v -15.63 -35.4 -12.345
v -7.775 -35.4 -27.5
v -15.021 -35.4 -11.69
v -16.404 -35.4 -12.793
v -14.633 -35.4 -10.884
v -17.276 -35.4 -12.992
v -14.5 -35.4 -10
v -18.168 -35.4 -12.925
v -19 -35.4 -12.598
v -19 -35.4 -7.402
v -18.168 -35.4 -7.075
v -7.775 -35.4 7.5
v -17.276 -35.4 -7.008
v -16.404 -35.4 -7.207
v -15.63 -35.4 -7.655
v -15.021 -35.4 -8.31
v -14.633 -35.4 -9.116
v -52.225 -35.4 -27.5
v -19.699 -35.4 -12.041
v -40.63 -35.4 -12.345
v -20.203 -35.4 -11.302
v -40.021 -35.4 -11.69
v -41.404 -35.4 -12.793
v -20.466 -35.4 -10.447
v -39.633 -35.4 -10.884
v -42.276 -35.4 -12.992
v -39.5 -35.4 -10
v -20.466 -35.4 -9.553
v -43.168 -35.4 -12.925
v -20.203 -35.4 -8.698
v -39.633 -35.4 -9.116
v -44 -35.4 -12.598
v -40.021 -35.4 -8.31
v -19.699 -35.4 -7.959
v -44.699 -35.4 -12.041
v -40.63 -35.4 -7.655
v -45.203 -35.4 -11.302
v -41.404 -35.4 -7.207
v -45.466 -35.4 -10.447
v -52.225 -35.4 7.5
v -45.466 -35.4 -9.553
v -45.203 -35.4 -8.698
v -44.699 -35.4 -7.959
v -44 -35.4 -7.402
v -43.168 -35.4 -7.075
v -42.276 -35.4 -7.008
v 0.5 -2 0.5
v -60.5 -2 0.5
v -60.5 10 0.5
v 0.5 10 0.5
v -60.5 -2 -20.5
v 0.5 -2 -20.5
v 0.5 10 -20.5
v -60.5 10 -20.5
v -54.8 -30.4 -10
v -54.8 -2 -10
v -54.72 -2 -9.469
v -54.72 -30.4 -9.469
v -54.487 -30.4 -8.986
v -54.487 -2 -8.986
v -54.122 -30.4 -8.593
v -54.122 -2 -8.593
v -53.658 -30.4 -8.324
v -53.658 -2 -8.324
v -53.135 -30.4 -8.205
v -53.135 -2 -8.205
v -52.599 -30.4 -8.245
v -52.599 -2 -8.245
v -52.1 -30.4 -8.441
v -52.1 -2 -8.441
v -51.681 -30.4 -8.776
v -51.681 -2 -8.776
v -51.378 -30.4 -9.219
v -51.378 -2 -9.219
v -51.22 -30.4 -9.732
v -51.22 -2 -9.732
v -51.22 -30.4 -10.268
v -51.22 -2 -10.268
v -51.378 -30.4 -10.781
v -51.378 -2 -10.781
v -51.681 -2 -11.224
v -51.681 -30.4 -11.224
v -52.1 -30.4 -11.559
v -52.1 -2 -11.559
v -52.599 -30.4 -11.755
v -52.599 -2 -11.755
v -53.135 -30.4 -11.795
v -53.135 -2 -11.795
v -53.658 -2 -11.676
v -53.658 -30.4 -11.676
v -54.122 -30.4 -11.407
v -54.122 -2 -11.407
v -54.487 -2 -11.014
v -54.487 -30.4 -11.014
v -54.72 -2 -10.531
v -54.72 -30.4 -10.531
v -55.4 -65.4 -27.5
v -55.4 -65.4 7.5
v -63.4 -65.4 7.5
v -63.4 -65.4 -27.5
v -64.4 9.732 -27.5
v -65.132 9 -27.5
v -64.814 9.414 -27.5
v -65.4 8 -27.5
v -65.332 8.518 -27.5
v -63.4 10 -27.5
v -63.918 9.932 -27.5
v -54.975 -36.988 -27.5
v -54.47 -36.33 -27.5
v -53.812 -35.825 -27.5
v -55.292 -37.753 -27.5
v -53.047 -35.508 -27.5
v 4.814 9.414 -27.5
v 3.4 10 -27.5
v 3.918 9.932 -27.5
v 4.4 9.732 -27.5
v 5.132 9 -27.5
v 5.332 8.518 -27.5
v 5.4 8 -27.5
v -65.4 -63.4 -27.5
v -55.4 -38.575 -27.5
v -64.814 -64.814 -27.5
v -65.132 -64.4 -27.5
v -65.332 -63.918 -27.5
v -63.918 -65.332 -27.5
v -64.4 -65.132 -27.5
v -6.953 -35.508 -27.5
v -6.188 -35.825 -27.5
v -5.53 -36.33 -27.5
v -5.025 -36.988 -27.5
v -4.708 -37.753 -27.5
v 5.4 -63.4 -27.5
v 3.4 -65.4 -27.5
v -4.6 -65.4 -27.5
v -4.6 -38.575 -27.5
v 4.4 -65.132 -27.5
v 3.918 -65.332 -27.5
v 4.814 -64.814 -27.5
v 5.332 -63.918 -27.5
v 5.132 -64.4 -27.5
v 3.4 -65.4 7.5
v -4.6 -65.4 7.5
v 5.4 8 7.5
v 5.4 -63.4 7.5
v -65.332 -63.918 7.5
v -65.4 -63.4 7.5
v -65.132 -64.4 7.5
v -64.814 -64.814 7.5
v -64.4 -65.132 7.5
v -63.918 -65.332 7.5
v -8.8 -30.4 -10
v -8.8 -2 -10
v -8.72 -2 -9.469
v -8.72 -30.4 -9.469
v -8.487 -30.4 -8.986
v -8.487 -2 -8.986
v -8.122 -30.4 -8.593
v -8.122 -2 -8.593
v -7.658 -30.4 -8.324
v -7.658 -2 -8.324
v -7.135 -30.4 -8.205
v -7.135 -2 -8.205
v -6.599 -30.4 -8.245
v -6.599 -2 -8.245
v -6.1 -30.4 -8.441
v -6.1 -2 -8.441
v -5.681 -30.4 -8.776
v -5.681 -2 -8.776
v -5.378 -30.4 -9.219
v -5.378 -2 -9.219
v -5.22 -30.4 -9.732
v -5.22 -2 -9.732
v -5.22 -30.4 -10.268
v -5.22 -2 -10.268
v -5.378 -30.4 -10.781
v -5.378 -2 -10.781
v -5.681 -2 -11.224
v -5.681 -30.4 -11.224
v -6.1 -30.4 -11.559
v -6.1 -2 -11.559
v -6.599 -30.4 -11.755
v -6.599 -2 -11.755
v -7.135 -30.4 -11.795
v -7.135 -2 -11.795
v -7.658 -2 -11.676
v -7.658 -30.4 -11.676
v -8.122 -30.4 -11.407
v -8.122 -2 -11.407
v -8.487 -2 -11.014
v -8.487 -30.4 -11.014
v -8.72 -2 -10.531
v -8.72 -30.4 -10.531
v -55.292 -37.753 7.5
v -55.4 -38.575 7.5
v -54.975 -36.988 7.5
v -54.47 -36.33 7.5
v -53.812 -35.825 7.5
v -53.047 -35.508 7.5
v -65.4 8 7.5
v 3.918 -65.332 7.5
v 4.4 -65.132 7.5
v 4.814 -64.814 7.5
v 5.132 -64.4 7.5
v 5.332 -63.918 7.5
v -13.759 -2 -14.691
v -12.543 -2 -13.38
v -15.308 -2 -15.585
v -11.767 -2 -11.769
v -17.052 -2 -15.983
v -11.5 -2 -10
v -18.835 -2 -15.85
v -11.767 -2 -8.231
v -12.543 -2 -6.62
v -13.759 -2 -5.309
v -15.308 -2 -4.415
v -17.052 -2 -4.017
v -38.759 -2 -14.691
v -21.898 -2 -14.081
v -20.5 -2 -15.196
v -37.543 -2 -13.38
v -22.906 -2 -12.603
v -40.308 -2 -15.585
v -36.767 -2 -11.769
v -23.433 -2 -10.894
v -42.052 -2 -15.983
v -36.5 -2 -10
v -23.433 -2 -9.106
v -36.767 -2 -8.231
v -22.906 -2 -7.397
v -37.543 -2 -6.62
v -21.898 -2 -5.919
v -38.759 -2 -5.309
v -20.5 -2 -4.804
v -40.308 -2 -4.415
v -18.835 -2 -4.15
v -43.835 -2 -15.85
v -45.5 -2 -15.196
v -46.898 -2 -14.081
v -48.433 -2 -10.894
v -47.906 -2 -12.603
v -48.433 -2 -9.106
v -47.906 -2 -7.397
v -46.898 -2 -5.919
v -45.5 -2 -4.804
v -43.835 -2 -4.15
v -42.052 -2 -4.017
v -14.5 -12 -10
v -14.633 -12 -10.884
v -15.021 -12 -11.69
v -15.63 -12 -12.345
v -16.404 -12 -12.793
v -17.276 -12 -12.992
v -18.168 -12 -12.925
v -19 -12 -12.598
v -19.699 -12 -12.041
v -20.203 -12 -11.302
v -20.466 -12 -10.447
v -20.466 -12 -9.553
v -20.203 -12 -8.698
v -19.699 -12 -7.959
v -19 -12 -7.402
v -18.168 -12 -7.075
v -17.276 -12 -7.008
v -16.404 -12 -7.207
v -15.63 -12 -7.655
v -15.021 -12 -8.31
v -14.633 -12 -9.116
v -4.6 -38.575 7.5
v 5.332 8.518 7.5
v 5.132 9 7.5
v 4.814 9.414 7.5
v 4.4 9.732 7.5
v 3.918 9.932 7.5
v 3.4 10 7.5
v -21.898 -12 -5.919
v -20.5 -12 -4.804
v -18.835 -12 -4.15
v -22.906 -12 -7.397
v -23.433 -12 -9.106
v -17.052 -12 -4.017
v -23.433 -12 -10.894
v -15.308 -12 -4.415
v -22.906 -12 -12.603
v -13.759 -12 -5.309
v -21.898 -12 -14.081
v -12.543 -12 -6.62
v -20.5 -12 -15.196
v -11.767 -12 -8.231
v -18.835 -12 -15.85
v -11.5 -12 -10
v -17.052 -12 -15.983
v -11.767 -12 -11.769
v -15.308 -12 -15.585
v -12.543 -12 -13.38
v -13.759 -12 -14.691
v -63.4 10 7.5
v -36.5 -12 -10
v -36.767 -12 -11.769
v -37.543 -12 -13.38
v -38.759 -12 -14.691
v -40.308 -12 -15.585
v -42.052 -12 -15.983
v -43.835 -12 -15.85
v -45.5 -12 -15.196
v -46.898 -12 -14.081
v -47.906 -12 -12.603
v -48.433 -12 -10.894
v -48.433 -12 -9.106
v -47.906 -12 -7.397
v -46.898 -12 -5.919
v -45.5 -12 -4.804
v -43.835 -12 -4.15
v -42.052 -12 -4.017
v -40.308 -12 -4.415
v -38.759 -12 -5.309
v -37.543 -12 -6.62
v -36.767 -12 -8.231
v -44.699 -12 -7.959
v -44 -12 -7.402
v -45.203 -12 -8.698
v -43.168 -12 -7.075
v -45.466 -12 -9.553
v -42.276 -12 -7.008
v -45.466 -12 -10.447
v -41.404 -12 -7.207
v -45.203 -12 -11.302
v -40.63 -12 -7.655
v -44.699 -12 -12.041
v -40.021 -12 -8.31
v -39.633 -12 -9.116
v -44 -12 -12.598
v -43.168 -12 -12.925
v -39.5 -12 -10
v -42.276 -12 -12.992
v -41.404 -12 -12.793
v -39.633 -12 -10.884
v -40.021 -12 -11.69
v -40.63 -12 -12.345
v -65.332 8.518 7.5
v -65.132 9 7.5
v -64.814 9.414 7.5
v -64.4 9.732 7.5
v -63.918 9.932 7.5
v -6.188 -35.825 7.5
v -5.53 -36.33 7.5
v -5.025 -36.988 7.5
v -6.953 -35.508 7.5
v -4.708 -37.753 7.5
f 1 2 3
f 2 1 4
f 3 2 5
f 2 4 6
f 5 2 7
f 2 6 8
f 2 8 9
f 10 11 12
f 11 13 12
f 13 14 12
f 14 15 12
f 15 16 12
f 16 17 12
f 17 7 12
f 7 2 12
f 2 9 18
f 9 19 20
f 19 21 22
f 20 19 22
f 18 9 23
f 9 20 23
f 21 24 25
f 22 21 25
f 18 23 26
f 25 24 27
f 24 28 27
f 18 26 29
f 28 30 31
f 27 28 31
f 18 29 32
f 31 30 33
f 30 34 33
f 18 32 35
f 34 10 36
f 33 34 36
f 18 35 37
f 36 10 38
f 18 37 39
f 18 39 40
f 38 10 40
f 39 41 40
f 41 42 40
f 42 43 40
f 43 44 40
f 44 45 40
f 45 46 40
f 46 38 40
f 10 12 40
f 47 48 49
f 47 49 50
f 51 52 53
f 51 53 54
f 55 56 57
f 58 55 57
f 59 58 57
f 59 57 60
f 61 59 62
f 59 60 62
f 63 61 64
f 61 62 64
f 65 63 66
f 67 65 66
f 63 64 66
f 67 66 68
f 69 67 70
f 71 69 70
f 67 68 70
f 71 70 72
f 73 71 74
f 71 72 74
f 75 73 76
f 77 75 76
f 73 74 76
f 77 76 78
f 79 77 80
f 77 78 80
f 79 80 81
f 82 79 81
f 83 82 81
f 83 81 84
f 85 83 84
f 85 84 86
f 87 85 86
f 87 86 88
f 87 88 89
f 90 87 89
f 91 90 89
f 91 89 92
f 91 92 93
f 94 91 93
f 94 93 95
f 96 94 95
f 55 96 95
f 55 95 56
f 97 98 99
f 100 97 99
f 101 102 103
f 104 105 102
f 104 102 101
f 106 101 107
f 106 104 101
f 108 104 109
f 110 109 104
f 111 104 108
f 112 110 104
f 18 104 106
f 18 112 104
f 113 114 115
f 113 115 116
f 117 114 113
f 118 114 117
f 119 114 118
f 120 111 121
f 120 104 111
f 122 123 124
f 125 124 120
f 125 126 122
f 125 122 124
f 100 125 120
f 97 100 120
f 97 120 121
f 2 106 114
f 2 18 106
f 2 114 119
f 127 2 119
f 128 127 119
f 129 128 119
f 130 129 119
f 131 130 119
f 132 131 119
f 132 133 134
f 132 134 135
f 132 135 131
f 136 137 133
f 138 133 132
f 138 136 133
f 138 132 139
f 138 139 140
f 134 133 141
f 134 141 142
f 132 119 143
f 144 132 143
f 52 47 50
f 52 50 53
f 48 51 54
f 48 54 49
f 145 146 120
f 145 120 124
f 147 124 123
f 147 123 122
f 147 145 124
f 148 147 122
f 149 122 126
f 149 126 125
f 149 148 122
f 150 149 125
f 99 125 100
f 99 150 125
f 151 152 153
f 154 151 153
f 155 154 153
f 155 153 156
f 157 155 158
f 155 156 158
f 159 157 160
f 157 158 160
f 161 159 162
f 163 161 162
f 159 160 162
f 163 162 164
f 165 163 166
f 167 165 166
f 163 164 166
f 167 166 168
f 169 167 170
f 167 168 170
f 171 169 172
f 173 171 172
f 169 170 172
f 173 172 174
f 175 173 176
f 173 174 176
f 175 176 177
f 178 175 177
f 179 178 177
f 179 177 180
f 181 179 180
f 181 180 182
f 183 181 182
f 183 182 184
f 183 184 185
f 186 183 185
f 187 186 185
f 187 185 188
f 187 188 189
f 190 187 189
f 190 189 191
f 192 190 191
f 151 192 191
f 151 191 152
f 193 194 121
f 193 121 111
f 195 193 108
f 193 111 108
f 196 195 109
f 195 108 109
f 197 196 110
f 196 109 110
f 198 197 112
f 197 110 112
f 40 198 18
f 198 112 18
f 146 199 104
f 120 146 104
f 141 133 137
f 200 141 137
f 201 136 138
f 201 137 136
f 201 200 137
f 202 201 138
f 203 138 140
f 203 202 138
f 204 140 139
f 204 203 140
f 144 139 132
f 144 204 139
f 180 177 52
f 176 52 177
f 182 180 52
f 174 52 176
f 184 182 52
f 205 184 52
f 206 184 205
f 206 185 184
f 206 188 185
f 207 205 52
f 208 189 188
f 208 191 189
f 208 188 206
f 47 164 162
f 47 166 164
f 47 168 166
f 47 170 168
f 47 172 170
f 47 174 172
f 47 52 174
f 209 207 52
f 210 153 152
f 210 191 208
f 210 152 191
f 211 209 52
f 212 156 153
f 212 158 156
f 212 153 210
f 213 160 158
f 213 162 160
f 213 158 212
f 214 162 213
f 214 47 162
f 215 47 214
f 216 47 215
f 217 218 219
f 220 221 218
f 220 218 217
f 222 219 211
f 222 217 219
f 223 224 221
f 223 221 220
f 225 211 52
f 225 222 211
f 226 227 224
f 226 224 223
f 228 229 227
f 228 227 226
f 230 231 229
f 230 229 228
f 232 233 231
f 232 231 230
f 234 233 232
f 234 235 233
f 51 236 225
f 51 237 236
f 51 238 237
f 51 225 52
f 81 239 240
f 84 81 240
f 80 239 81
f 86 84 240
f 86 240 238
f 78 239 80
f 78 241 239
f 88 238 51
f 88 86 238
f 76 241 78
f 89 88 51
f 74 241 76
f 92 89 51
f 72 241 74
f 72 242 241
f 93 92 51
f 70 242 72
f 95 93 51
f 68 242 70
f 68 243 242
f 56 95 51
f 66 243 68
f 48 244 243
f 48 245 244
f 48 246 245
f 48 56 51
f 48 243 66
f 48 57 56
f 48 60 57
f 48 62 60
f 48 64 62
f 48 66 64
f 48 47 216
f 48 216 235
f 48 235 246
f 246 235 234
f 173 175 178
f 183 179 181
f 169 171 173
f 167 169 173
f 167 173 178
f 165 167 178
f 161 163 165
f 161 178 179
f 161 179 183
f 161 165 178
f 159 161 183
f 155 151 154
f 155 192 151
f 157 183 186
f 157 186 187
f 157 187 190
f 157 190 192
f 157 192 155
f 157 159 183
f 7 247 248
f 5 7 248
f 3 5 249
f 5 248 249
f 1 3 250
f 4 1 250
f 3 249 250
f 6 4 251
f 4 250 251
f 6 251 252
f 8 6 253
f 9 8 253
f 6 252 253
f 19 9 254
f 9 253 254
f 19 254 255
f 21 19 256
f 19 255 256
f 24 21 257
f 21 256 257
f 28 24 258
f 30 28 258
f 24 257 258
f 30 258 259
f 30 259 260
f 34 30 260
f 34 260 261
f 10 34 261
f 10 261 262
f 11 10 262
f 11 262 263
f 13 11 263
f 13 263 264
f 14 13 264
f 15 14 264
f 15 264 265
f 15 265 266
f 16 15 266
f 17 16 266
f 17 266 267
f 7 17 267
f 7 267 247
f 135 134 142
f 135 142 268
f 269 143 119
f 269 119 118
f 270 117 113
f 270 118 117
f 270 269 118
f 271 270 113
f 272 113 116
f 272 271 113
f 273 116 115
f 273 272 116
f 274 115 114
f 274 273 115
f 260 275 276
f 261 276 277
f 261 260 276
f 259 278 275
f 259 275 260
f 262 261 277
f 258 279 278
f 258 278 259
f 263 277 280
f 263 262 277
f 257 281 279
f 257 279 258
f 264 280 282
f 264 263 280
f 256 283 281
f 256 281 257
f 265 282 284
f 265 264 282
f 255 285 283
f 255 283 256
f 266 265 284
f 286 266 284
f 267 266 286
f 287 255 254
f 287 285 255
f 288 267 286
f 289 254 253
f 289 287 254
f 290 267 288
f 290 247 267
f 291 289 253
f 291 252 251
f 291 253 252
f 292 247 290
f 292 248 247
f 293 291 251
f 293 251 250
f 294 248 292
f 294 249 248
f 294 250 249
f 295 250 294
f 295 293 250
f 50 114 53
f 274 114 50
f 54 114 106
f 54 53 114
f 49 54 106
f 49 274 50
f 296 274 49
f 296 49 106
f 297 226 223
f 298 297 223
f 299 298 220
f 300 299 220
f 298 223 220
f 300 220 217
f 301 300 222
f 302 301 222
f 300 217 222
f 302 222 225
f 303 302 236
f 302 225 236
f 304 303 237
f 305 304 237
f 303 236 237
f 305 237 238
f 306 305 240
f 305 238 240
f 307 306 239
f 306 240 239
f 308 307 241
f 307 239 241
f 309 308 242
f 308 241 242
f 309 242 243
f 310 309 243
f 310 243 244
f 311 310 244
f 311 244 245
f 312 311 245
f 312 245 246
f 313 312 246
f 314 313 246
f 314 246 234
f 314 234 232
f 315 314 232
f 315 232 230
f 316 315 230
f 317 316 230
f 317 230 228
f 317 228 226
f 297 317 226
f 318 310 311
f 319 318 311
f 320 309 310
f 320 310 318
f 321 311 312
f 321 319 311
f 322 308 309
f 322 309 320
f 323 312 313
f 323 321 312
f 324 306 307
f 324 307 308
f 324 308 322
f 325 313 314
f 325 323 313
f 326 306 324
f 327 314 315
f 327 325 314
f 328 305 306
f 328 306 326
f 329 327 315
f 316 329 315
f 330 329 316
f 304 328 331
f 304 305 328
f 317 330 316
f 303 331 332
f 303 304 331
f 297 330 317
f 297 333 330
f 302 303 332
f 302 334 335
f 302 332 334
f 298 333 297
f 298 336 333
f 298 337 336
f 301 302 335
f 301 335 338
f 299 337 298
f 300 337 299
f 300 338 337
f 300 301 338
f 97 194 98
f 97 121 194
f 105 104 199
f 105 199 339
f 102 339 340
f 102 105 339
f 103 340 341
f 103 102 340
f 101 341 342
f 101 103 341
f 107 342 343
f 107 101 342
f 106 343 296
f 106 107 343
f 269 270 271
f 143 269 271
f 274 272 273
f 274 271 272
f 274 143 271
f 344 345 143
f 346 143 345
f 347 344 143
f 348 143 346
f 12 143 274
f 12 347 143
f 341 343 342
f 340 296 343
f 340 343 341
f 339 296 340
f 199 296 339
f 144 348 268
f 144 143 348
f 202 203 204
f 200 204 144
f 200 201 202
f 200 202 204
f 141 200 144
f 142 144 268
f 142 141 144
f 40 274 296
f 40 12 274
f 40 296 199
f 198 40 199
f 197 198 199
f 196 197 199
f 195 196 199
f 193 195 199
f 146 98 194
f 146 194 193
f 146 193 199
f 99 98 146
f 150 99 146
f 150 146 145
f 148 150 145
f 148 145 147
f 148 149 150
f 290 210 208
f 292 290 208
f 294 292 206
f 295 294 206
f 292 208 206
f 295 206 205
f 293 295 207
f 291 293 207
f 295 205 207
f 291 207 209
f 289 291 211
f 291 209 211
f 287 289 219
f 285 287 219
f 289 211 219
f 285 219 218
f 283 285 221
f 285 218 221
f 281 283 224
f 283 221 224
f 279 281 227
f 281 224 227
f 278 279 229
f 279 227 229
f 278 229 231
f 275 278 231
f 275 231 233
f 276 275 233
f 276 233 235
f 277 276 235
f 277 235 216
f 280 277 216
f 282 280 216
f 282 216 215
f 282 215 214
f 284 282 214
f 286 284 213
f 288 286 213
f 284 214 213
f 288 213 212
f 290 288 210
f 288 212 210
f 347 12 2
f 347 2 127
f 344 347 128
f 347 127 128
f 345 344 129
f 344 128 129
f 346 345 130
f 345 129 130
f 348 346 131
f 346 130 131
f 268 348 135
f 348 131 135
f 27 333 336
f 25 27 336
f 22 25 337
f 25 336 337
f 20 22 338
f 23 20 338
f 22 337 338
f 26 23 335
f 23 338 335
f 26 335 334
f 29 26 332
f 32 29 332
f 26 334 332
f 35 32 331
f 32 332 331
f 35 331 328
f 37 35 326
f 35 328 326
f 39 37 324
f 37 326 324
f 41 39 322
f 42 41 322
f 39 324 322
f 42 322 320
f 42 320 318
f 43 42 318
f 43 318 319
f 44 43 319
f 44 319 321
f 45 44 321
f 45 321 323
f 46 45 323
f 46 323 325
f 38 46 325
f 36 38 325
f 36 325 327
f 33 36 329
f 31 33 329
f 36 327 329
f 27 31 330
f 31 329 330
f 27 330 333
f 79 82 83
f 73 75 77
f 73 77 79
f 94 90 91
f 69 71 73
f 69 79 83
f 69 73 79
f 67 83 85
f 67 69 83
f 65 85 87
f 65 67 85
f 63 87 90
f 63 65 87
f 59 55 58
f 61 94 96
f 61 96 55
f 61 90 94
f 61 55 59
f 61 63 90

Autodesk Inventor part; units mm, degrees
ref_plane "YZ Plane" through (0, 0, 0) normal (1, 0, 0) x (0, 1, 0)
ref_plane "XZ Plane" through (0, 0, 0) normal (0, 1, 0) x (-1, 0, 0)
ref_plane "XY Plane" through (0, 0, 0) normal (0, 0, 1) x (1, 0, 0)
sketch "Sketch1" plane through (0, 0, 0) normal (0, 1, 0) x (-1, 0, 0)
  line L0 (0, 0) -> (60, 0) construction
  line L1 (60, 0) -> (60, -20) construction
  line L2 (60, -20) -> (0, -20) construction
  line L3 (0, -20) -> (0, 0) construction
  line L4 (60.5, 0.5) -> (-0.5, 0.5)
  line L5 (-0.5, 0.5) -> (-0.5, -20.5)
  line L6 (-0.5, -20.5) -> (60.5, -20.5)
  line L7 (60.5, -20.5) -> (60.5, 0.5)
  circle A0 centre (53, -10) radius 1.8
  circle A1 centre (7, -10) radius 1.8
  line L8 (53, -10) -> (7, -10) construction
  point P0 (30, -10)
  point P1 (30, -20)
  point P2 (7, -10)
  point P3 (0, -10)
  dimension "d0" = 20
  dimension "d1" = 60
  dimension "d2" = 0.5
  dimension "d3" = 0.5
  dimension "d4" = 0.5
  dimension "d5" = 0.5
  dimension "d6" = 3.6
  dimension "d7" = 46
sketch "Sketch2" plane through (0, 0, 0) normal (0, 1, 0) x (-1, 0, 0)
  line L0 (-5.4, 7.5) -> (65.4, 7.5)
  line L1 (65.4, 7.5) -> (65.4, -27.5)
  line L2 (65.4, -27.5) -> (-5.4, -27.5)
  line L3 (-5.4, -27.5) -> (-5.4, 7.5)
  line L4 (60.5, -20.5) -> (60.5, 0.5) construction
  line L5 (-0.5, 0.5) -> (-0.5, -20.5) construction
  line L6 (-0.5, -20.5) -> (60.5, -20.5) construction
  point P0 (0, 0)
  point P1 (60.5, -10)
  point P2 (65.4, -10)
  point P3 (30, -20.5)
  point P4 (30, -27.5)
  dimension "d9" = 70.8
  dimension "d10" = 35
extrude "Extrusion1" add sketch "Sketch2" along normal blind 10 and the other way blind 35.4
extrude "Extrusion2" cut sketch "Sketch1" along normal blind 10 and the other way blind 2
extrude "Extrusion3" cut sketch "Sketch1" along normal blind 10 and the other way blind 30.4 contours A0 | A1
sketch "Sketch3" plane through (5.4, 10, -27.5) normal (0, 0, -1) x (-1, 0, 0)
  line L0 (70.8, -45.4) -> (0, -45.4) projected
  line L1 (0, -45.4) -> (0, -75.4)
  line L2 (0, -75.4) -> (10, -75.4)
  line L3 (10, -75.4) -> (10, -48.575)
  line L4 (13.175, -45.4) -> (57.625, -45.4)
  line L5 (60.8, -48.575) -> (60.8, -75.4)
  line L6 (60.8, -75.4) -> (70.8, -75.4)
  line L7 (70.8, -75.4) -> (70.8, -45.4)
  arc A0 (13.175, -45.4) -> (10, -48.575) centre (13.175, -48.575) ccw
  arc A1 (60.8, -48.575) -> (57.625, -45.4) centre (57.625, -48.575) ccw
  point P0 (5.4, -10)
  point P1 (10, -45.4)
  point P2 (60.8, -45.4)
  point P3 (35.4, -45.4)
  point P4 (13.175, -45.4)
  point P5 (57.625, -45.4)
  dimension "d23" = 50.8
  dimension "d24" = 3.175
  dimension "d25" = 10
  dimension "d26" = 30
extrude "Extrusion4" add sketch "Sketch3" against normal up to surface (35 mm away)
sketch "Sketch4" plane through (0, -2, 0) normal (0, 1, 0) x (1, 0, 0)
  circle A0 centre (-42.5, 10) radius 3
  circle A1 centre (-17.5, 10) radius 3
  line L0 (-60.5, 20.5) -> (0.5, 20.5) construction
  line L1 (-60.5, -0.5) -> (-60.5, 20.5) construction
  line L2 (-42.5, 10) -> (-17.5, 10) construction
  point P0 (0, 0)
  point P1 (-30, 20.5)
  point P2 (-30, 10)
  point P3 (-60.5, 10)
  dimension "d29" = 6
  dimension "d30" = 25
extrude "Extrusion5" cut sketch "Sketch4" against normal up to surface (33.4 mm away)
sketch "Sketch5" plane through (0, -2, 0) normal (0, 1, 0) x (1, 0, 0)
  circle A0 centre (-42.5, 10) radius 3 construction
  circle A1 centre (-17.5, 10) radius 3 construction
  circle A2 centre (-17.5, 10) radius 6
  circle A3 centre (-42.5, 10) radius 6
  point P0 (0, 0)
  dimension "d34" = 12
extrude "Extrusion6" cut sketch "Sketch5" against normal blind 10
fillet "Fillet1" radius 2 2 edges at (-65.4, 10, -10) (5.4, 10, -10)
fillet "Fillet2" radius 2 2 edges at (-65.4, -65.4, -10) (5.4, -65.4, -10)
properties part number "BK12_Spacer"
